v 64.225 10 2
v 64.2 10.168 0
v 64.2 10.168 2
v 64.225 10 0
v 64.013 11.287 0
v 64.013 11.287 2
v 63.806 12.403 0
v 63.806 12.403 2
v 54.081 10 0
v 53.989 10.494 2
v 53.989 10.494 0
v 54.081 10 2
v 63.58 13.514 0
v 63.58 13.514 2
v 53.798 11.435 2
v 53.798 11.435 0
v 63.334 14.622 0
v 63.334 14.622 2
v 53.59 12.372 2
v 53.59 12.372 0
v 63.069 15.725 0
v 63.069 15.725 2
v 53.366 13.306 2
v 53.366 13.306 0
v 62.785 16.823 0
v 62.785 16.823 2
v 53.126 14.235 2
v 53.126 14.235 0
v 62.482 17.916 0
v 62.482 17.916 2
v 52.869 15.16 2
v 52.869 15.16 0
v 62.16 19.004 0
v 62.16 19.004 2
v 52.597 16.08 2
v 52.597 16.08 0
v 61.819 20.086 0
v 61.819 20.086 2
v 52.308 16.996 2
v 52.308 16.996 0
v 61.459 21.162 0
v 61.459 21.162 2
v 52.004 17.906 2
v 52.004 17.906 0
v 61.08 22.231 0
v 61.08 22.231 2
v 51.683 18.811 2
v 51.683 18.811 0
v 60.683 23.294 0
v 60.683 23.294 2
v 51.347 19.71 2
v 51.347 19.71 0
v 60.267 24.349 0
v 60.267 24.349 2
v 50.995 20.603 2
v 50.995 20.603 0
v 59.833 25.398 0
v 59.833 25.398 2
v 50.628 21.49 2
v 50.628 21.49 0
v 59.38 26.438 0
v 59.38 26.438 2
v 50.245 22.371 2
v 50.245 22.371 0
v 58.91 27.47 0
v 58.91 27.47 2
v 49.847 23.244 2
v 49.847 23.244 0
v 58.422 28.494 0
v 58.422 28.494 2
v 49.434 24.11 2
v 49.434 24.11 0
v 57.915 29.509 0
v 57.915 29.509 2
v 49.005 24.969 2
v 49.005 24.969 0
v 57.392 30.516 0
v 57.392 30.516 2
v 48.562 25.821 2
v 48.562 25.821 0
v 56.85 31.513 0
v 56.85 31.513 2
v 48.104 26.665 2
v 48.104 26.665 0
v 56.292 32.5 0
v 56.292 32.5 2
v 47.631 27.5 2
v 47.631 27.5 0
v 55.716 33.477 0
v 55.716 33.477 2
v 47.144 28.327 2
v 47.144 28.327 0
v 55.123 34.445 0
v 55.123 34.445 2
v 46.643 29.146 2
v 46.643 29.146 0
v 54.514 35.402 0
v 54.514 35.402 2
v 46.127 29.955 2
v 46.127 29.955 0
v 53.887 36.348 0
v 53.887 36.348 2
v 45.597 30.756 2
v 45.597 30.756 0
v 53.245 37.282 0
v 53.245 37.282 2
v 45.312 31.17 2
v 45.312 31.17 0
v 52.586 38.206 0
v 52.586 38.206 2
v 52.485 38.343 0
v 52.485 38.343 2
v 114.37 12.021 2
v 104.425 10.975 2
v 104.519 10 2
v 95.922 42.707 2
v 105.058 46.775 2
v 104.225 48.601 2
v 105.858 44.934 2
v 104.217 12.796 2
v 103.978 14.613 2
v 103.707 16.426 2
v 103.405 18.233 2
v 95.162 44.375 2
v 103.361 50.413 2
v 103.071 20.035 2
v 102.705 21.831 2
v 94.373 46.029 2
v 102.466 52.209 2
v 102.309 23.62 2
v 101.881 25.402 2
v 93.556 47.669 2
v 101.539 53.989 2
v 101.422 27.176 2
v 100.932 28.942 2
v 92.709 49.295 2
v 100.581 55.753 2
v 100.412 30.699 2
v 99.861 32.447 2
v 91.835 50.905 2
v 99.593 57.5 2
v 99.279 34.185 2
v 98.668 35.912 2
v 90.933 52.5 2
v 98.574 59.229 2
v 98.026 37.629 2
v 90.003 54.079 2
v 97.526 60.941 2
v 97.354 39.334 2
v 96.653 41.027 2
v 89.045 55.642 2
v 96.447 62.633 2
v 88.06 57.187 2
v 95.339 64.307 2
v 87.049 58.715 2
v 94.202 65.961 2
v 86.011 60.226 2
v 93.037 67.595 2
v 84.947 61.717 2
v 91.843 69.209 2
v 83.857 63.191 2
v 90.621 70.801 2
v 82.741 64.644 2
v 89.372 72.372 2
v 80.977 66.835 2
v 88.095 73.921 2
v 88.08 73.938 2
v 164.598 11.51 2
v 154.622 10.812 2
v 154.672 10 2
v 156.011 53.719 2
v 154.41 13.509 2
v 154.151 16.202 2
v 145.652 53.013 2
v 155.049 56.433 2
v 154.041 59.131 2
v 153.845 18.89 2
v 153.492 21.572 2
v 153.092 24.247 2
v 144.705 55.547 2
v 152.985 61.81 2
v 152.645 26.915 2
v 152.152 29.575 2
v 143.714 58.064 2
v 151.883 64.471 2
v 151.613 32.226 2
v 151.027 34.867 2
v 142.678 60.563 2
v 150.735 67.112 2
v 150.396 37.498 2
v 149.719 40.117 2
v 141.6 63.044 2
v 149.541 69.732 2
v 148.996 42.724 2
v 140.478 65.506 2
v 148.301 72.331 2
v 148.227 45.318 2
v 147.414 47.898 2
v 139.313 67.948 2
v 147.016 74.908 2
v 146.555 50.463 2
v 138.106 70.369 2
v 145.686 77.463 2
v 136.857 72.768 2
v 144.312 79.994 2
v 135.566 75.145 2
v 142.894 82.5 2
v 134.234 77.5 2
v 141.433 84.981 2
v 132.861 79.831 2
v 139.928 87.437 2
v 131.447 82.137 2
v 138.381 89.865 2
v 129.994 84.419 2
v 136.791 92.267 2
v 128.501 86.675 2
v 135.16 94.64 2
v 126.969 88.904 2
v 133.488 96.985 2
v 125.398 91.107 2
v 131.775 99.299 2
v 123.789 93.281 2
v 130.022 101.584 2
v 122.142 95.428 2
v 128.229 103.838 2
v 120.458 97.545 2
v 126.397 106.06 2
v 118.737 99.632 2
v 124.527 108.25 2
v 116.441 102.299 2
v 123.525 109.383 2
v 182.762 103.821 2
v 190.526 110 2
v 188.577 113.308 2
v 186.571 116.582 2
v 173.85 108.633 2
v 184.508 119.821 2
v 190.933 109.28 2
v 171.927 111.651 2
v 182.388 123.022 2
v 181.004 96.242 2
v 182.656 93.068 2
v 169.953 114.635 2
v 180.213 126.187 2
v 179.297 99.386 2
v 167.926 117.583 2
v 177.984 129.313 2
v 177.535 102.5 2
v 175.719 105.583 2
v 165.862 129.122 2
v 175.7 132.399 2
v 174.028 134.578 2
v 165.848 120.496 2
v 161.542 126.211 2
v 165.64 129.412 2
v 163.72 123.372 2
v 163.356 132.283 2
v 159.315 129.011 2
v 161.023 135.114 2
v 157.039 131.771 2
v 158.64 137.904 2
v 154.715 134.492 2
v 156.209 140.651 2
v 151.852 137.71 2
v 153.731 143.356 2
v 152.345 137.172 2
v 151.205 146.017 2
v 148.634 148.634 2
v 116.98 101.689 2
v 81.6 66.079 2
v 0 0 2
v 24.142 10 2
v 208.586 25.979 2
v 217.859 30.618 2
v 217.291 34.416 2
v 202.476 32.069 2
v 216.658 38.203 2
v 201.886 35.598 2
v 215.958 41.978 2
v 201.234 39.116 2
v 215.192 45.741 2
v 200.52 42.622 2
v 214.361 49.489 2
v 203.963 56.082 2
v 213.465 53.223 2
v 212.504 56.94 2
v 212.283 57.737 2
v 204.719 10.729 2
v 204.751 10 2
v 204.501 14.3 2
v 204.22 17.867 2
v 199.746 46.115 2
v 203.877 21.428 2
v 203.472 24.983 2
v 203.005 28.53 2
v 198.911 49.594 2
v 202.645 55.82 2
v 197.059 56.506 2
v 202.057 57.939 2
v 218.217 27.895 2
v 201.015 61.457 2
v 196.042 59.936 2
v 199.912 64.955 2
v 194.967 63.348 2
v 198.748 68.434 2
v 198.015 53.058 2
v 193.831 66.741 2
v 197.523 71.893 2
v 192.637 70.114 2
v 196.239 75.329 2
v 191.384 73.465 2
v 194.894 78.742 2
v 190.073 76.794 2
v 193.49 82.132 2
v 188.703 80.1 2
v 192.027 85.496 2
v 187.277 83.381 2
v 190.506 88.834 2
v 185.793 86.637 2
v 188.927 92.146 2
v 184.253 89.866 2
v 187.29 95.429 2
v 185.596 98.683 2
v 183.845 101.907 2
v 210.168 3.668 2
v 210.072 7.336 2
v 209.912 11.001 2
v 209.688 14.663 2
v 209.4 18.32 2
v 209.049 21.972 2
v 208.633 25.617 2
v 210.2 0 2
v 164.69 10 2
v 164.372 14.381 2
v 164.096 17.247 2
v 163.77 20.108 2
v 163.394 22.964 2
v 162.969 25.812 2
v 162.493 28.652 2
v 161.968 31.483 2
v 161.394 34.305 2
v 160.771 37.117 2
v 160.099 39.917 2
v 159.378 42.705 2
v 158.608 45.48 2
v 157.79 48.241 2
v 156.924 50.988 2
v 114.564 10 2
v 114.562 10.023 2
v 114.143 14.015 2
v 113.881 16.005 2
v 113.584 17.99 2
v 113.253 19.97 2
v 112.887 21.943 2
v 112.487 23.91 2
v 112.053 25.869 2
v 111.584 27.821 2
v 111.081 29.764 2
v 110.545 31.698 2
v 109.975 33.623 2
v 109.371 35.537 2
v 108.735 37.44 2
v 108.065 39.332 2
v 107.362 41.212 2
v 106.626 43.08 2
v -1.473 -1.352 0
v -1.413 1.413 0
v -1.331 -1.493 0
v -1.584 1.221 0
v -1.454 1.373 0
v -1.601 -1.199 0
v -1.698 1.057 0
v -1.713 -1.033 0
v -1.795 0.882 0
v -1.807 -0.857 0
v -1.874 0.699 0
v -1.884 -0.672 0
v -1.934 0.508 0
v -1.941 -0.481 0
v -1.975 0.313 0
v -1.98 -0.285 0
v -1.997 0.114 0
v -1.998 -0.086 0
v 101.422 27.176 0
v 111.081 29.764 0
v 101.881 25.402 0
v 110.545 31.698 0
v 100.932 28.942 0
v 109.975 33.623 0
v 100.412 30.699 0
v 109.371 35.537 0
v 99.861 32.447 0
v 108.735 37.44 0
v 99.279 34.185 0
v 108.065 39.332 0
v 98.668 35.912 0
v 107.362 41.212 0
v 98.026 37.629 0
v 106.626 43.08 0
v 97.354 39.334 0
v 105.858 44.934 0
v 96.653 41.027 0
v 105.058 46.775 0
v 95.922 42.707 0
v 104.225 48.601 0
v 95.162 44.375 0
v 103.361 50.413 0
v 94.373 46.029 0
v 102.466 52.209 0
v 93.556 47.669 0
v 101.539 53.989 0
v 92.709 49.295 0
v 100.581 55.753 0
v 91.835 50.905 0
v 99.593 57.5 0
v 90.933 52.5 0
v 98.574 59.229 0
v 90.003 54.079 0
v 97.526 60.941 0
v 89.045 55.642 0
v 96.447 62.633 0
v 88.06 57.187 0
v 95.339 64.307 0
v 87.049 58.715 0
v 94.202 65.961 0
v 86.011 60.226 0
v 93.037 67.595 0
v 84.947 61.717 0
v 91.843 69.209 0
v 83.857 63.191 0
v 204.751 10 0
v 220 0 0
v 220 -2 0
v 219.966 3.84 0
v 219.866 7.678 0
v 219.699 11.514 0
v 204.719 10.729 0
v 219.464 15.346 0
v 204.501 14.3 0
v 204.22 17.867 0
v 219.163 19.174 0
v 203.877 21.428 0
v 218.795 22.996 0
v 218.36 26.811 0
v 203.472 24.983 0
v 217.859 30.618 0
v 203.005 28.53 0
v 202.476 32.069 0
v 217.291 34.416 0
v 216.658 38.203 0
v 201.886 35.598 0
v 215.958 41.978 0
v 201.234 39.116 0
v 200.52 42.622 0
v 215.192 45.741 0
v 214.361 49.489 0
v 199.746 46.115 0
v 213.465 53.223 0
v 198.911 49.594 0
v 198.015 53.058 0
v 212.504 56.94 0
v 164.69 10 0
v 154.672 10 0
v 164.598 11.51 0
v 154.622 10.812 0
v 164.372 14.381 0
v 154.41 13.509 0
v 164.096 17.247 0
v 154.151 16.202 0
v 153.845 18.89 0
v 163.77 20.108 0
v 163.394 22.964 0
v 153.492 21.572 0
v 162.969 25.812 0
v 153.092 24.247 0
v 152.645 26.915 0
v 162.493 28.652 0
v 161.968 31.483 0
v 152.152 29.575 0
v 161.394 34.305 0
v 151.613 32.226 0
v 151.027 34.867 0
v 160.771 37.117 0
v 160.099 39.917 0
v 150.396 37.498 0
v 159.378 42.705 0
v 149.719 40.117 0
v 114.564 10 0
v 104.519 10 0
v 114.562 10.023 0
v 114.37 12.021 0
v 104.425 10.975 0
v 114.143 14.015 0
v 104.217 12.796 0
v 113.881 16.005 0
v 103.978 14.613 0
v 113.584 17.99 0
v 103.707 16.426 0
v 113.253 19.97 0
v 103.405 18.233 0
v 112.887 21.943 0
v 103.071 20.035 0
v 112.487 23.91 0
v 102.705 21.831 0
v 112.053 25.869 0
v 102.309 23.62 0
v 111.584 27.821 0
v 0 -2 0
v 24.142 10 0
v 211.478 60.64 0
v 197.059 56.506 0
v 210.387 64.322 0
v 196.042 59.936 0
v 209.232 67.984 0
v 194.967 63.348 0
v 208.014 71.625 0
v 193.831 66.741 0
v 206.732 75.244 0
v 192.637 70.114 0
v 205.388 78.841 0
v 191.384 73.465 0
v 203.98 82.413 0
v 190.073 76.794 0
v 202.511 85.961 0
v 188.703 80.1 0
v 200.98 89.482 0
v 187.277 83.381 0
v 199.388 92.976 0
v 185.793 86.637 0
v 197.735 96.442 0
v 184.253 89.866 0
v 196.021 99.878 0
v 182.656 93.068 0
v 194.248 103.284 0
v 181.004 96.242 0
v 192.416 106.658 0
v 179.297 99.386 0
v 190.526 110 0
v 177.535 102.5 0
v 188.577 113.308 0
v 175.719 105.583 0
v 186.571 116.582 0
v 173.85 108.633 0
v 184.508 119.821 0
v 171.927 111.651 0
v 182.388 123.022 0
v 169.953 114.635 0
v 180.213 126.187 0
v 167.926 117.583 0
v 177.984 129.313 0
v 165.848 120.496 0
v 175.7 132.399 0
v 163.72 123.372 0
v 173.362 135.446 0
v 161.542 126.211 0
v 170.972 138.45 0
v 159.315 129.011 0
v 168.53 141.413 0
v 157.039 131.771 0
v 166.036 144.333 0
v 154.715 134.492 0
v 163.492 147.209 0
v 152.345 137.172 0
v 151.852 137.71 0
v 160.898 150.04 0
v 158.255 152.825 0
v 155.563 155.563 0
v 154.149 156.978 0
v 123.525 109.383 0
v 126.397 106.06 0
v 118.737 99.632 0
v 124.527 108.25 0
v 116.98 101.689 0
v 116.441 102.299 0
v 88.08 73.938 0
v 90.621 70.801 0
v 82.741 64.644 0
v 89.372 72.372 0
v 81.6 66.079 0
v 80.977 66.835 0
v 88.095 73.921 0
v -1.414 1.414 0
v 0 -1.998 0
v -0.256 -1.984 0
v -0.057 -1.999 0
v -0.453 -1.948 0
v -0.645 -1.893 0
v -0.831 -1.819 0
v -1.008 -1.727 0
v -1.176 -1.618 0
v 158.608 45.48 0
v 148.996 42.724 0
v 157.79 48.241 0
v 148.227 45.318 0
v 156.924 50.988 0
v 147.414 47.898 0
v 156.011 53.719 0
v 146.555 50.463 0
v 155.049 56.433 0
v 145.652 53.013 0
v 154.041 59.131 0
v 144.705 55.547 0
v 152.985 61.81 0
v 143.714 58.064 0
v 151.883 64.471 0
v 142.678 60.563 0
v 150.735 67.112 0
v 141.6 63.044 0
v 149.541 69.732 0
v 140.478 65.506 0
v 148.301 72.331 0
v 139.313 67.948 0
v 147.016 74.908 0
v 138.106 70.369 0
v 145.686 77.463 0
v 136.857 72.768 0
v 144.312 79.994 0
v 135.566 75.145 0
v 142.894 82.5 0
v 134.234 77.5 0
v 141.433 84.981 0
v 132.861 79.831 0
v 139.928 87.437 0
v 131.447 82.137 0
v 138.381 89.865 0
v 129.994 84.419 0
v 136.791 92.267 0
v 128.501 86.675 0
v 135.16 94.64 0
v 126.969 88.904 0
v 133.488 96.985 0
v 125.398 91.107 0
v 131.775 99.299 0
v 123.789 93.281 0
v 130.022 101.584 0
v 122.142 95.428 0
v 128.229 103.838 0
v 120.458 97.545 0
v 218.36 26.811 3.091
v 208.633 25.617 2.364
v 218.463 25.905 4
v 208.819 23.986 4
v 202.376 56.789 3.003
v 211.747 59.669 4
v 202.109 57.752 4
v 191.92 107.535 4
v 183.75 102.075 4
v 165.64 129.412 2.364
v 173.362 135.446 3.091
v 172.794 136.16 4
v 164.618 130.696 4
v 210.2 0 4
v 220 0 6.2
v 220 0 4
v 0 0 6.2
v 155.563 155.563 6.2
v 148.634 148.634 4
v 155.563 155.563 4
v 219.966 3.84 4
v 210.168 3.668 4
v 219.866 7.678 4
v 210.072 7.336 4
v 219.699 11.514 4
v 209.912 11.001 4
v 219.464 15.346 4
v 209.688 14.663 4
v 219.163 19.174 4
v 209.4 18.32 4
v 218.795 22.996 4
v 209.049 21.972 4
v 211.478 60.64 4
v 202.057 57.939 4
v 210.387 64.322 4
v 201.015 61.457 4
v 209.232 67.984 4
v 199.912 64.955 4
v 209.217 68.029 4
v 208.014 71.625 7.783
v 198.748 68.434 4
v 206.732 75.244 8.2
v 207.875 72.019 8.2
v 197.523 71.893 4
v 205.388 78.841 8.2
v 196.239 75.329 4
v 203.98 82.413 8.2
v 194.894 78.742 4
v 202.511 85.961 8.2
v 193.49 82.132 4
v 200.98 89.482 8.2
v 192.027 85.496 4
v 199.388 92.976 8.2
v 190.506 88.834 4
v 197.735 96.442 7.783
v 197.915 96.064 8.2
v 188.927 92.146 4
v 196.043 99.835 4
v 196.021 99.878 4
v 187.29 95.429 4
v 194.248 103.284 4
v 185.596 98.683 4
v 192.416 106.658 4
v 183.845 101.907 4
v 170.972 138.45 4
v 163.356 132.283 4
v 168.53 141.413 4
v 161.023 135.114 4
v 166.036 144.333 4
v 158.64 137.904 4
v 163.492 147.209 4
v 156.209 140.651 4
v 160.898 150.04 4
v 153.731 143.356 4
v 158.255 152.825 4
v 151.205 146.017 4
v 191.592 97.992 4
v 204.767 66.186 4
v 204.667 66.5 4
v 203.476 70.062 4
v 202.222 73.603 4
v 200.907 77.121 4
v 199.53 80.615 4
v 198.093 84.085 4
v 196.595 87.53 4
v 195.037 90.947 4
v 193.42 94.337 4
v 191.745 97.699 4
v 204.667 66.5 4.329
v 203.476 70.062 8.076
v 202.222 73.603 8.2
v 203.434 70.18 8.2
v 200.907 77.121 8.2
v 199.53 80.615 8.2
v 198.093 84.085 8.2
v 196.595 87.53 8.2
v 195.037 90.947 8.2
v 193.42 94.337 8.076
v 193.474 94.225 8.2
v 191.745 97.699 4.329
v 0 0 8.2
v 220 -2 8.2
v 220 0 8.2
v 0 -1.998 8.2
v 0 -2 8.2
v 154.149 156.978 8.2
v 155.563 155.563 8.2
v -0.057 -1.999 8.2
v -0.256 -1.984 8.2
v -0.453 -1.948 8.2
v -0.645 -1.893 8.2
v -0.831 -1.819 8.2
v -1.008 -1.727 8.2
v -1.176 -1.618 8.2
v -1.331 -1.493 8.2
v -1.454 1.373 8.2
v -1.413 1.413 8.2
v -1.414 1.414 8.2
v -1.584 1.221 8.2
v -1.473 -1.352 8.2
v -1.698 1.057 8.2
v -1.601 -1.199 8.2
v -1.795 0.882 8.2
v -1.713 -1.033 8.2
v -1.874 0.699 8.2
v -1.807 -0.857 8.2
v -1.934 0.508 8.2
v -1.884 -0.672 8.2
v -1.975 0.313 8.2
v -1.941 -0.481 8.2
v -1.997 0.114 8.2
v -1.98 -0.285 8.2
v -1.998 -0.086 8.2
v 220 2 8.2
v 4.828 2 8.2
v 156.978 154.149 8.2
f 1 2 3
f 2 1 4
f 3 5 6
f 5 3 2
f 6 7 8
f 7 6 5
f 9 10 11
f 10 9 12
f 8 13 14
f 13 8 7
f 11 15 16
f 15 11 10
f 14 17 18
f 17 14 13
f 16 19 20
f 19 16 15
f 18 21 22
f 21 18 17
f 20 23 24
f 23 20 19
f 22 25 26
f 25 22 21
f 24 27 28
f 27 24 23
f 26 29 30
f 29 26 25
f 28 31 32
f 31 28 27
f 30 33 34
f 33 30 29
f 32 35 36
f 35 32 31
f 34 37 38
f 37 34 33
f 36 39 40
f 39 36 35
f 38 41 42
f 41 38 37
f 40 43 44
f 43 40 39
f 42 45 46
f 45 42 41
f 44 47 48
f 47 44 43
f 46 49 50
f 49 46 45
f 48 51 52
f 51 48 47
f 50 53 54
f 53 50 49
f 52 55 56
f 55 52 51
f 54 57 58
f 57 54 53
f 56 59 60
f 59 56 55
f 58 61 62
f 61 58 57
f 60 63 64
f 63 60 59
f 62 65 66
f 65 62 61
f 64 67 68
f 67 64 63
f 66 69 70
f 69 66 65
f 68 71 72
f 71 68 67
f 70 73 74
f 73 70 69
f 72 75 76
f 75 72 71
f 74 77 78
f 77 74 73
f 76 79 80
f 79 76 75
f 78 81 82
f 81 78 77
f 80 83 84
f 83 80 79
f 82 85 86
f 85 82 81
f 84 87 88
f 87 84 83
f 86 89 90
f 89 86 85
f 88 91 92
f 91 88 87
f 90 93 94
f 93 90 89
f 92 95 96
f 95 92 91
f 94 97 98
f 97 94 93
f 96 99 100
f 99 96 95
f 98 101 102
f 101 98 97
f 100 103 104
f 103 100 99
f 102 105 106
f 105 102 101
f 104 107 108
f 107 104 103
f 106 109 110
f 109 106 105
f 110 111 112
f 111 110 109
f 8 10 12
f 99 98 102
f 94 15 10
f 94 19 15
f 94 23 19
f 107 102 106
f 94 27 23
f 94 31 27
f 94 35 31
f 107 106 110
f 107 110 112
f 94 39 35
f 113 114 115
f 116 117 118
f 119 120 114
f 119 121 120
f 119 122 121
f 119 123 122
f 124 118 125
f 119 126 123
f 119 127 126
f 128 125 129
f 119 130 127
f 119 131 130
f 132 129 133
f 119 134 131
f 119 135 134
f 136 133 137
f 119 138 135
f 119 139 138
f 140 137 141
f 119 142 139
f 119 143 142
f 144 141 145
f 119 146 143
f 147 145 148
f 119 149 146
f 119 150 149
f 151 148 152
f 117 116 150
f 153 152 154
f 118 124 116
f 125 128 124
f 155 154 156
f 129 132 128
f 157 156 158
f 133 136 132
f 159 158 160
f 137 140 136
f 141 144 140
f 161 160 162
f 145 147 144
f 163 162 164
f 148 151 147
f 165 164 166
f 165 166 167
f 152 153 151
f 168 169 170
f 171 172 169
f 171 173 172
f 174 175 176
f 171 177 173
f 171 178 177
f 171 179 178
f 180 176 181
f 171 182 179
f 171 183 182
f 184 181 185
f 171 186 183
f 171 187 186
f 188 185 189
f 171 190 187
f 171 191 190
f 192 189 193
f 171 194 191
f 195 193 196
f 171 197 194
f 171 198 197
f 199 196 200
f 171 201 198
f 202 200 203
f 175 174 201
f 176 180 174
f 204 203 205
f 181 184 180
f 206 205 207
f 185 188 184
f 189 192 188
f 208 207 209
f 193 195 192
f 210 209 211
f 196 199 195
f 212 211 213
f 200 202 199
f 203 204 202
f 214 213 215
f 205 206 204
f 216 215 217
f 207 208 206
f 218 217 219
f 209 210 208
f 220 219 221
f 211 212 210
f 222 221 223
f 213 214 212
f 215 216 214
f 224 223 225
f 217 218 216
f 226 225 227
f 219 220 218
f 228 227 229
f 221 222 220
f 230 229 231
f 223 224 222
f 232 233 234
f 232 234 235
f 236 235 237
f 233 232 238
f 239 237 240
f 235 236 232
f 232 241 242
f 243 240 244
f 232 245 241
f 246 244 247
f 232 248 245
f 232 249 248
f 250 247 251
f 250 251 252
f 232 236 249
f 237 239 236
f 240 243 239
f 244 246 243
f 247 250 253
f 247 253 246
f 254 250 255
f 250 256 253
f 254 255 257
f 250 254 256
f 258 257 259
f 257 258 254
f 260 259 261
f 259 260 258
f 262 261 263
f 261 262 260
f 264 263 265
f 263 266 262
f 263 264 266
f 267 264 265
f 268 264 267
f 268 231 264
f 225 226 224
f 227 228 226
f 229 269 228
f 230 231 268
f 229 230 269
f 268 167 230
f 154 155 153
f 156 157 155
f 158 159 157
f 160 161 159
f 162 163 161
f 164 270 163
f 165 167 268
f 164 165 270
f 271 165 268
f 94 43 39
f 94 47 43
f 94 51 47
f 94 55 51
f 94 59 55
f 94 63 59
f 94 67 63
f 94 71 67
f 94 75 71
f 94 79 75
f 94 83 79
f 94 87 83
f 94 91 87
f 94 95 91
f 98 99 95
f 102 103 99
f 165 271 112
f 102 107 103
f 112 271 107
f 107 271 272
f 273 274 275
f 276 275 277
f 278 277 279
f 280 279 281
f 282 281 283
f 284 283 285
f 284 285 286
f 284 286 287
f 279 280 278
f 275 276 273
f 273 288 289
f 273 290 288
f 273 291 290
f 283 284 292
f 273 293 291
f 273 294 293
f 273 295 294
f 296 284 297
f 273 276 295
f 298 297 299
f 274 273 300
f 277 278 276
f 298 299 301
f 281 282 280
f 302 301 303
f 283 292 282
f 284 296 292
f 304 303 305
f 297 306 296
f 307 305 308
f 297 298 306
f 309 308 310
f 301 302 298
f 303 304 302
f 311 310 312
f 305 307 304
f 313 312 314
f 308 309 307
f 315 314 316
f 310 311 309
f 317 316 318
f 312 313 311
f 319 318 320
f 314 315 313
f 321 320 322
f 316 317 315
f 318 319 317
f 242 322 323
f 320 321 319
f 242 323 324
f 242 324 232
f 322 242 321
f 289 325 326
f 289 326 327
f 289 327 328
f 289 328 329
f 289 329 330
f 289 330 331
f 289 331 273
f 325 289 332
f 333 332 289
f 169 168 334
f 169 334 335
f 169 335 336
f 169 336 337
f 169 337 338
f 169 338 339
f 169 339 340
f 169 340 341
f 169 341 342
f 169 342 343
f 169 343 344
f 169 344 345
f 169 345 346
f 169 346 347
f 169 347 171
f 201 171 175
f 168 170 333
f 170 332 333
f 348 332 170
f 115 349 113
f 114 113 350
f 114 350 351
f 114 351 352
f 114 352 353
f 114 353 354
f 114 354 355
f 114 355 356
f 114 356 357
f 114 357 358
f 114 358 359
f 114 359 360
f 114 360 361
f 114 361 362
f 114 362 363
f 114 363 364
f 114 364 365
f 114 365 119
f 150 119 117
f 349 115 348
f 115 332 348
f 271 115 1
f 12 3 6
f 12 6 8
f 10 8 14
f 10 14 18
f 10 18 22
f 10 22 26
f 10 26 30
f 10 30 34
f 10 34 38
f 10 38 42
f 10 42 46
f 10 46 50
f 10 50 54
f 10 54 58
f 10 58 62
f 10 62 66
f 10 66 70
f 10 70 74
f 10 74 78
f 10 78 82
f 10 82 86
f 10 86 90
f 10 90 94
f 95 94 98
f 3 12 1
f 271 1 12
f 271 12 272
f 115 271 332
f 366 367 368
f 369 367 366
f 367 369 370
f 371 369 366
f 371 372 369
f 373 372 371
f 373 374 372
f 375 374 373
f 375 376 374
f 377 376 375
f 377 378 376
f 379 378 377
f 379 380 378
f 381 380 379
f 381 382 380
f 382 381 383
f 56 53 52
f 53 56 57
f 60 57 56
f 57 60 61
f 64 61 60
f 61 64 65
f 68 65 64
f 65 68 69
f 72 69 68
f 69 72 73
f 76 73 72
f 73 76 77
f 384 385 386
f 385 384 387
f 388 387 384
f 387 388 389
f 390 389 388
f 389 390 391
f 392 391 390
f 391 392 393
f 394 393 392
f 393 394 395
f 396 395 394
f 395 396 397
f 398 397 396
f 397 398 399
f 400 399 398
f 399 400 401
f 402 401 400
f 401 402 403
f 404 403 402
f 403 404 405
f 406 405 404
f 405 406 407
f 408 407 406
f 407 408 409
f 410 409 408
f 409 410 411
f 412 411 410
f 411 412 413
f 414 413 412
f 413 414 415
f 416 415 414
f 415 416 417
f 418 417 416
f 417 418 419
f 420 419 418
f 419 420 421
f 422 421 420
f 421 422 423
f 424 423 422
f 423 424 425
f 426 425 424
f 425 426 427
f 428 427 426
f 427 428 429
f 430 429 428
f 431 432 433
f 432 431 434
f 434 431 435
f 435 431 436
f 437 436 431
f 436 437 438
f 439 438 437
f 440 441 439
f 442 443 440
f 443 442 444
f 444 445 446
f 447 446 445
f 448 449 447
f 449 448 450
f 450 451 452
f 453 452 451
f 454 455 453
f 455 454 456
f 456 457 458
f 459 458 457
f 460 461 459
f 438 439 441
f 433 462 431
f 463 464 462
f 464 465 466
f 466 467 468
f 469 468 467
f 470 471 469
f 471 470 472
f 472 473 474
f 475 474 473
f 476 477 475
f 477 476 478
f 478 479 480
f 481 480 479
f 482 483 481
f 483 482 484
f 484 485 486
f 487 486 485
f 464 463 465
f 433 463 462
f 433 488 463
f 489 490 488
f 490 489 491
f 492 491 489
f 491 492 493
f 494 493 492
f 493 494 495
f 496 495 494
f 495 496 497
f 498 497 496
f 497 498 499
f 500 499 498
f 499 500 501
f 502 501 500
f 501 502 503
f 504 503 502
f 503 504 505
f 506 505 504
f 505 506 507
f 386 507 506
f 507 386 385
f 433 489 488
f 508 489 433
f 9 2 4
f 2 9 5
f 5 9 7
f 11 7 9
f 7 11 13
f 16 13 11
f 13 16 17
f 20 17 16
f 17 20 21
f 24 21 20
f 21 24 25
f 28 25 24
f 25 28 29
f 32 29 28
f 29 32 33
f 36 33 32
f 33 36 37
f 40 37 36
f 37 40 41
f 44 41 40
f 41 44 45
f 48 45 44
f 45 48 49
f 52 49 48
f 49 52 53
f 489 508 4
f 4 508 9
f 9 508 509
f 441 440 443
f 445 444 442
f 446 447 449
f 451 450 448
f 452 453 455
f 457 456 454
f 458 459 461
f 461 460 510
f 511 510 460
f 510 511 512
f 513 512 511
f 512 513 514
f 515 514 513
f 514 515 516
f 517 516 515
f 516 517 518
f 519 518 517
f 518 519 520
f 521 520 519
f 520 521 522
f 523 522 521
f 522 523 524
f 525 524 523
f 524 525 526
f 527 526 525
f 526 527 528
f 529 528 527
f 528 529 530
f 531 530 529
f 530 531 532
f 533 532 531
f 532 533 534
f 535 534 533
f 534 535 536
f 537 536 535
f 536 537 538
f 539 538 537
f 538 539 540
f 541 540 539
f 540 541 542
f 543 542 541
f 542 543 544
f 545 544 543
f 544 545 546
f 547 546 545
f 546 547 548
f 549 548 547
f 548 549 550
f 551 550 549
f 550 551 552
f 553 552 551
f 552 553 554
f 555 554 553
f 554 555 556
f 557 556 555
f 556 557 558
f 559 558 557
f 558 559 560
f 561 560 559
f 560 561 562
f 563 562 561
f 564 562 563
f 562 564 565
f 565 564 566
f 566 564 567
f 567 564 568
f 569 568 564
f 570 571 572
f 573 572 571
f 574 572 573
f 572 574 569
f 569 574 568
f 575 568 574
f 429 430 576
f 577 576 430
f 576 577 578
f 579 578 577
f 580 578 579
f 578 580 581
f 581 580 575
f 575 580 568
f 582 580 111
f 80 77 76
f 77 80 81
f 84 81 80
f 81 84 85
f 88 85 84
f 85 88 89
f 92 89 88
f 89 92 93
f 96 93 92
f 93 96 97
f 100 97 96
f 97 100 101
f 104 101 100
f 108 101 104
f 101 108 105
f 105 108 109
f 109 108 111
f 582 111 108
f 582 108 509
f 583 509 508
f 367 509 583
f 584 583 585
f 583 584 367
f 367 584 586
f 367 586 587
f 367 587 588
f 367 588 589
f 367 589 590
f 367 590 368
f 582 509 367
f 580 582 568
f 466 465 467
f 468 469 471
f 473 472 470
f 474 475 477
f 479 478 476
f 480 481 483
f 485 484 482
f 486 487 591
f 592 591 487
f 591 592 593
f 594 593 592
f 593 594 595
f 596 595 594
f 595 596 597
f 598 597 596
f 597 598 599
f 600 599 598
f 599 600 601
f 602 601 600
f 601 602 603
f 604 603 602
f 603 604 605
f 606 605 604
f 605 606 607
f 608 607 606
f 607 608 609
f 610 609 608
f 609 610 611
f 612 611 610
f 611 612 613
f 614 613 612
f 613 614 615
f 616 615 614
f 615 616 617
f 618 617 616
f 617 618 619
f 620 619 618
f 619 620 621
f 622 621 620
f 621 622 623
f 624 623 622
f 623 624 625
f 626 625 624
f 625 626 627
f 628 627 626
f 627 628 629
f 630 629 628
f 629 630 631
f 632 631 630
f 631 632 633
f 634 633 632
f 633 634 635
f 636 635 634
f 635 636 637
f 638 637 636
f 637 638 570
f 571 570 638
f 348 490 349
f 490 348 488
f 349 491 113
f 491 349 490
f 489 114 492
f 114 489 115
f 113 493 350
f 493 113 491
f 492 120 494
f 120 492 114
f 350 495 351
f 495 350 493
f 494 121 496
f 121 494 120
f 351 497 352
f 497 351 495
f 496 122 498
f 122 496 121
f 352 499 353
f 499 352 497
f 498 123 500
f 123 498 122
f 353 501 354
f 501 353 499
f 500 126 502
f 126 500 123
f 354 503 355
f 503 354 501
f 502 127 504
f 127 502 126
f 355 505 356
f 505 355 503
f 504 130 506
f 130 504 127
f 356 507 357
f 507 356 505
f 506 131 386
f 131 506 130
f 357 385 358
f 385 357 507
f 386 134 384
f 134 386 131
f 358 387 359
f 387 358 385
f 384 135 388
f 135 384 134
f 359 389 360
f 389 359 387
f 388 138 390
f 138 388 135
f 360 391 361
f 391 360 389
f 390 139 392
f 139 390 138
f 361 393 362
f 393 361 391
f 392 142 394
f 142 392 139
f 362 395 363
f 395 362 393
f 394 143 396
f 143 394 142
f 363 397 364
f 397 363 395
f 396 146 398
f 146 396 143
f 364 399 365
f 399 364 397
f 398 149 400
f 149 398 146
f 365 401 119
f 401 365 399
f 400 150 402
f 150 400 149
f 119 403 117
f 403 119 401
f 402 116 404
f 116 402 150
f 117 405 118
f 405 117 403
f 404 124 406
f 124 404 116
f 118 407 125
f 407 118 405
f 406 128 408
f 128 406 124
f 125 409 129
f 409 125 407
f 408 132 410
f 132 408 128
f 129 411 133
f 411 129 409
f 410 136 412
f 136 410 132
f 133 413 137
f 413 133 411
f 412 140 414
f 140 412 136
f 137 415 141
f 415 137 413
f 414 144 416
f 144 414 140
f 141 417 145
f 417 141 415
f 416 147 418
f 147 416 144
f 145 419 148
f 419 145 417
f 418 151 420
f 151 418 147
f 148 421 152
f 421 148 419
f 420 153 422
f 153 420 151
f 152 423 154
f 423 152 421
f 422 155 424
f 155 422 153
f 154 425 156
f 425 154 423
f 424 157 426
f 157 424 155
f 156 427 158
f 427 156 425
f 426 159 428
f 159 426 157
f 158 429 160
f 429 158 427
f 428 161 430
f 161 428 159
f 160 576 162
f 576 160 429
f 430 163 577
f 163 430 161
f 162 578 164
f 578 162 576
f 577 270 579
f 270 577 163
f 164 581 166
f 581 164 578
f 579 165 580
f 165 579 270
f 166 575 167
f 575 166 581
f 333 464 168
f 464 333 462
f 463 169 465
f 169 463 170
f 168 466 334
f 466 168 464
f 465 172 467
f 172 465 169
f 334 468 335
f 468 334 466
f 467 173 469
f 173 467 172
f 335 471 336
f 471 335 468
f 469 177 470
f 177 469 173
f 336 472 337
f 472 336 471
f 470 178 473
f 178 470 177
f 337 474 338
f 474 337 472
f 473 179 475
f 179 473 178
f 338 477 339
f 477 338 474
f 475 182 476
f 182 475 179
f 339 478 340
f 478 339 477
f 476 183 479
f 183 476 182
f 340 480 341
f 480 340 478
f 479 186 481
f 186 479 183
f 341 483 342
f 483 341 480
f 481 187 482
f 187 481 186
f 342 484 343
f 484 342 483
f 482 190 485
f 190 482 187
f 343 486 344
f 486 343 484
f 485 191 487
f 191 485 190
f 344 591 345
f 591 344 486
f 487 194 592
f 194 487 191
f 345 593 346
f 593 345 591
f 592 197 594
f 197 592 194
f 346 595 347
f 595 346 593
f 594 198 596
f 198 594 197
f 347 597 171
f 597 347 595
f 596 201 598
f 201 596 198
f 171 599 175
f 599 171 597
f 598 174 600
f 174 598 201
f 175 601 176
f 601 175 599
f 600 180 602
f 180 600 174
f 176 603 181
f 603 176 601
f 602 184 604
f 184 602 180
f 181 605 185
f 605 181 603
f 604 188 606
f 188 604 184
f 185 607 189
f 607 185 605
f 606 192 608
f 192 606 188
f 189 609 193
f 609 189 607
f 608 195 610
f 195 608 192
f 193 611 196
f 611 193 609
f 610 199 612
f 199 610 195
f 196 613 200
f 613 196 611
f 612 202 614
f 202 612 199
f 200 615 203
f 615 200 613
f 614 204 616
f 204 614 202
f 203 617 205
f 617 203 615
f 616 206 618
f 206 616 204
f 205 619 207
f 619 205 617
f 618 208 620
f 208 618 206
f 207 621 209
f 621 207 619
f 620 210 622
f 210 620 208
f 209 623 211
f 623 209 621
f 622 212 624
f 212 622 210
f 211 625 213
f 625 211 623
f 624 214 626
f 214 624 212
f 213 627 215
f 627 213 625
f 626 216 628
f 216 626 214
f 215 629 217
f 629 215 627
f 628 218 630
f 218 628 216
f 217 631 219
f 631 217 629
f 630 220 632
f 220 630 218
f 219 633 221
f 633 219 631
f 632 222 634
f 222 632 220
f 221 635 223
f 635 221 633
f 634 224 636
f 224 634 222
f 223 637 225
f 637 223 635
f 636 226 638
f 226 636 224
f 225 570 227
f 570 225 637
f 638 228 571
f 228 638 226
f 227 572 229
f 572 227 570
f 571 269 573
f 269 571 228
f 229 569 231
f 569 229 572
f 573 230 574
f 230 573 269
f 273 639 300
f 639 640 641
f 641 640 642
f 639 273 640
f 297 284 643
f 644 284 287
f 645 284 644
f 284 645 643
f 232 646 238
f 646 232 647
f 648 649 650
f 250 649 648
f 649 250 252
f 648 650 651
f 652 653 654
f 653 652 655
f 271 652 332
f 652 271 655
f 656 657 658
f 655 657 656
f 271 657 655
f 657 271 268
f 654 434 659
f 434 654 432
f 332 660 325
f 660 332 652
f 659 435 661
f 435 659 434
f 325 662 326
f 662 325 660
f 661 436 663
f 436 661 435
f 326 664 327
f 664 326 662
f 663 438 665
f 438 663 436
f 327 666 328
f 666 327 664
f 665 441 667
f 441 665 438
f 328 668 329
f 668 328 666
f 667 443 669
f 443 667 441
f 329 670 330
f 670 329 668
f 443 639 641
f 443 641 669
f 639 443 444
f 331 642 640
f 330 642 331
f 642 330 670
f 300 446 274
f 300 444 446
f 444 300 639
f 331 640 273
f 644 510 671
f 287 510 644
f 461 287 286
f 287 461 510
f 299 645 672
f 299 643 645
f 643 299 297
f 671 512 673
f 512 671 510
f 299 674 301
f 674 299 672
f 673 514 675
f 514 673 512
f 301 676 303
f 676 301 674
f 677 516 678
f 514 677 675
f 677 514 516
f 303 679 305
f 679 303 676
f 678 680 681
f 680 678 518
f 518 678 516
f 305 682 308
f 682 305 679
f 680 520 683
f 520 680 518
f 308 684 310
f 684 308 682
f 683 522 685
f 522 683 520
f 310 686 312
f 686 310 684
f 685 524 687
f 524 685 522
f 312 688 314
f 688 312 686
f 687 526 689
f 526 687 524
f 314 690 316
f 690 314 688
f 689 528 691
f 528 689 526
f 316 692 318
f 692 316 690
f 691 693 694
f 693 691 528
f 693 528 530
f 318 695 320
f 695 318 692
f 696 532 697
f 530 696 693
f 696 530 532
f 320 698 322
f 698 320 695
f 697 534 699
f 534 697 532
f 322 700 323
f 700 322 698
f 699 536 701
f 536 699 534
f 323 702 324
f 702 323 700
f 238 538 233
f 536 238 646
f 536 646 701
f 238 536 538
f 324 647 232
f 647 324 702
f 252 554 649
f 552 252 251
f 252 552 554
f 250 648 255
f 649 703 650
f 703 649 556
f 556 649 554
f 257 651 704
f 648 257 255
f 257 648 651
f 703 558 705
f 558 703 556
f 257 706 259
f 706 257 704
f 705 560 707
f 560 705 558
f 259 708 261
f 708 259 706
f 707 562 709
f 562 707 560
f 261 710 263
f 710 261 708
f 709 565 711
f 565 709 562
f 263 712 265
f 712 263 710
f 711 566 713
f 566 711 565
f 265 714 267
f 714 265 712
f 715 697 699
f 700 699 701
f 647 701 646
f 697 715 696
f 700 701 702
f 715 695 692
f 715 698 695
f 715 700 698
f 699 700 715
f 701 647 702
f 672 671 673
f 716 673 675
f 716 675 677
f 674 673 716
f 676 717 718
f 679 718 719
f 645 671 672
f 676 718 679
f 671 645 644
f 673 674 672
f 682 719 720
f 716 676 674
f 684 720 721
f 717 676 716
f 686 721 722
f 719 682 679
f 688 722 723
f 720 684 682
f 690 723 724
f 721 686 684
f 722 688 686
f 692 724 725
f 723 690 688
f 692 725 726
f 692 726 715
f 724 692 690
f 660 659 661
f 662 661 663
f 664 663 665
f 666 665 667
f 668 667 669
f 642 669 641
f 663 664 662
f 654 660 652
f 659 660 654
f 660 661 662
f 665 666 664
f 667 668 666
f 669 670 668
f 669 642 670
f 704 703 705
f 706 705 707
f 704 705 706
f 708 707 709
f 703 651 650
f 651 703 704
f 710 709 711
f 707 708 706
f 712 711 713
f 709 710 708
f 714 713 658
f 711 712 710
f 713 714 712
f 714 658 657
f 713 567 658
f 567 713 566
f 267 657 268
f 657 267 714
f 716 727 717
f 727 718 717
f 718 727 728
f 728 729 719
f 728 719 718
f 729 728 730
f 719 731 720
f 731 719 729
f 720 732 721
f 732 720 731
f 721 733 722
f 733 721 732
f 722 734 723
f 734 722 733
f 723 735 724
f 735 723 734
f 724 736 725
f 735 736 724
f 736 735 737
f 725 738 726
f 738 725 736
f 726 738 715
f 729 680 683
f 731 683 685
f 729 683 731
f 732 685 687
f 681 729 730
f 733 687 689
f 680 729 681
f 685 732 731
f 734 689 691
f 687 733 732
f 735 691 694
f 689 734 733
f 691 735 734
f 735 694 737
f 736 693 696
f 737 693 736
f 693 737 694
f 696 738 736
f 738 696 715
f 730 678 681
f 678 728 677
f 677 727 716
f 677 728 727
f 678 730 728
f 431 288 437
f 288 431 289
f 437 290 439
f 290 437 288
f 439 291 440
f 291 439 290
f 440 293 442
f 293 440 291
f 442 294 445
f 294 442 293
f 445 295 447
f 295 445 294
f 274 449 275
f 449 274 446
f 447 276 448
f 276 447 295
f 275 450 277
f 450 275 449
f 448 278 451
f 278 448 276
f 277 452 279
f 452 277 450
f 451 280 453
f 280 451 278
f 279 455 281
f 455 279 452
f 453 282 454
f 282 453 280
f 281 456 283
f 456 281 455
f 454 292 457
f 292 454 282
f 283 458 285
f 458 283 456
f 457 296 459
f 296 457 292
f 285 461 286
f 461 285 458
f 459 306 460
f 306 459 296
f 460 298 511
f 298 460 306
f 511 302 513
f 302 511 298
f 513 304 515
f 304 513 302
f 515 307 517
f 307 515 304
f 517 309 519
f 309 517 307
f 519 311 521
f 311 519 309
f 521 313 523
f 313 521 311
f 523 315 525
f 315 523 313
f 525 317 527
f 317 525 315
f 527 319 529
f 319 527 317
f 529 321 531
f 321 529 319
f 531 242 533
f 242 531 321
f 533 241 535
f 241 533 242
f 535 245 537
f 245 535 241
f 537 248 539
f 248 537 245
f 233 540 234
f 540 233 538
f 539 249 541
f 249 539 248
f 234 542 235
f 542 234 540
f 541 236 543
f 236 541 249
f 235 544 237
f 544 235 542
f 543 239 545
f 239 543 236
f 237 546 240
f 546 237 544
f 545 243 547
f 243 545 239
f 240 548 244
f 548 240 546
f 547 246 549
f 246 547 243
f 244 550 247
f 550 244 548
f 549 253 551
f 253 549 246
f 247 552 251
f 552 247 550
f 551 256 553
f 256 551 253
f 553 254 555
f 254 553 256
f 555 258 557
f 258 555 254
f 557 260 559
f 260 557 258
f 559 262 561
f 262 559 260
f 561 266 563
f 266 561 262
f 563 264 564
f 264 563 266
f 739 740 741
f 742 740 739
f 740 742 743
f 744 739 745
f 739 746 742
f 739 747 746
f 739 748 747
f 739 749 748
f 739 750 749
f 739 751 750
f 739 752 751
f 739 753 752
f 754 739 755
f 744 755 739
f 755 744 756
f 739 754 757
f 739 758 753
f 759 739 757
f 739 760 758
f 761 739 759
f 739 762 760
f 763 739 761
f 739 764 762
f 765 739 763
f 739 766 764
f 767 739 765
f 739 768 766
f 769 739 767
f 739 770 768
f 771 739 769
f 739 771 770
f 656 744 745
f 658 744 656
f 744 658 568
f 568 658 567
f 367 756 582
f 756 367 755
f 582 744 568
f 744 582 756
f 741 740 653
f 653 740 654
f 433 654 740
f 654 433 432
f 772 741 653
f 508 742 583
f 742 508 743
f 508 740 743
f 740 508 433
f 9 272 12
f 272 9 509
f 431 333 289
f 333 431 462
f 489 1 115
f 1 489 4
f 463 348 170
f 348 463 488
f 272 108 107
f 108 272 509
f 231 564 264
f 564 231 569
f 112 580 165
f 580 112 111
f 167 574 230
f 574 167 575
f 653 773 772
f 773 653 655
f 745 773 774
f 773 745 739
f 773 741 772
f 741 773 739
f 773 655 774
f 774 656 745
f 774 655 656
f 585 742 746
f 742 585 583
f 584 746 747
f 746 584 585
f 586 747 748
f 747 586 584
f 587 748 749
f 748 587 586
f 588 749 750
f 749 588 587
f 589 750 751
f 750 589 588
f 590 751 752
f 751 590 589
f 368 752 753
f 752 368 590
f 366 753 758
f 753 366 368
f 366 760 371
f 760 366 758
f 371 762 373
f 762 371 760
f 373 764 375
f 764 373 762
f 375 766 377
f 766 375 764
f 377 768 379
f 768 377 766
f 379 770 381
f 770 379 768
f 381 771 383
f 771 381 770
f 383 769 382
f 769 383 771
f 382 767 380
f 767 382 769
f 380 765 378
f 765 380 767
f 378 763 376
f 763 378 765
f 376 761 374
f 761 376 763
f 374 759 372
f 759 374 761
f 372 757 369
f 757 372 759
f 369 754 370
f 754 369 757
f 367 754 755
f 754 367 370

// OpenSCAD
/* [Rendering Precision] */
// minimum angle for a fragment
$fa=1;
// minimum size of a fragment
$fs=0.2;

module txt(i, a, t)
    rotate([0,0,a])
        translate([i+5,0,2])
            rotate([0,0,-90])
                linear_extrude(0.8, center=true)
                    text(str(t), size=8,
                         valign="center",
                         halign="center");

module rads(st)
for(i=[st:20:205])
    difference() {
        rotate_extrude(angle=45)
            translate([i,0])
                square([10,2]);
        if(i%10)
            txt(i, 45/2, i/10+0.5);
        else {
            txt(i, 35, i/10);
            txt(i, 10, i/10+1);
        }
    }

module radpat(st) {
    translate([2,0,0]) rads(st);
    rotate([0,0,45]) rads(st+10);
}

module case() {
    rotate_extrude(angle=45)
        square([10,2]);
    for(i=[55,105,155])
    rotate_extrude(angle=45)
        translate([i,0])
            square([10,2]);
    rotate_extrude(angle=45)
        translate([205,0])
            square([15,2]);
    rotate([0,0,45]) cube([220,2,8.2]);
    translate([0,-2,0]) cube([220,2,8.2]);
    translate([8,0,0]) cube([210,10,2]);
    rotate([0,0,45])
        translate([8,-10,0]) cube([210,10,2]);
    rotate([90,0,90])
        linear_extrude(220)
            polygon([[0,6.2], [2,8.2], [0,8.2]]);
    rotate([90,0,135])
        linear_extrude(220)
            polygon([[0,6.2], [-2,8.2], [0,8.2]]);
    rotate_extrude(angle=-315)
        square([2,8.2]);
    difference() {
        translate([0,0,2])
            rotate_extrude(angle=45)
                translate([210.2,0])
                    square([9.8,2]);
        for(i=[1,3])
            translate([0,0,8])
                rotate([45,0,i*45/4])
                    translate([217.5,0,0])
                        cube(30, center=true);
    }
    intersection() {
        translate([0,0,4])
            rotate_extrude(angle=45)
                translate([215.2,0])
                    square([4.8,4.2]);
        rotate([45,0,45/2])
            translate([217.5,0,0])
                cube(30, center=true);
    }
    if(0) %union() {
        translate([0,0,2]) {
            rads(0);
            rads(10);
        }
        translate([0,0,4]) {
            rads(5);
            rads(15);
        }
    }
}

//radpat(0);
//radpat(5);
case();
